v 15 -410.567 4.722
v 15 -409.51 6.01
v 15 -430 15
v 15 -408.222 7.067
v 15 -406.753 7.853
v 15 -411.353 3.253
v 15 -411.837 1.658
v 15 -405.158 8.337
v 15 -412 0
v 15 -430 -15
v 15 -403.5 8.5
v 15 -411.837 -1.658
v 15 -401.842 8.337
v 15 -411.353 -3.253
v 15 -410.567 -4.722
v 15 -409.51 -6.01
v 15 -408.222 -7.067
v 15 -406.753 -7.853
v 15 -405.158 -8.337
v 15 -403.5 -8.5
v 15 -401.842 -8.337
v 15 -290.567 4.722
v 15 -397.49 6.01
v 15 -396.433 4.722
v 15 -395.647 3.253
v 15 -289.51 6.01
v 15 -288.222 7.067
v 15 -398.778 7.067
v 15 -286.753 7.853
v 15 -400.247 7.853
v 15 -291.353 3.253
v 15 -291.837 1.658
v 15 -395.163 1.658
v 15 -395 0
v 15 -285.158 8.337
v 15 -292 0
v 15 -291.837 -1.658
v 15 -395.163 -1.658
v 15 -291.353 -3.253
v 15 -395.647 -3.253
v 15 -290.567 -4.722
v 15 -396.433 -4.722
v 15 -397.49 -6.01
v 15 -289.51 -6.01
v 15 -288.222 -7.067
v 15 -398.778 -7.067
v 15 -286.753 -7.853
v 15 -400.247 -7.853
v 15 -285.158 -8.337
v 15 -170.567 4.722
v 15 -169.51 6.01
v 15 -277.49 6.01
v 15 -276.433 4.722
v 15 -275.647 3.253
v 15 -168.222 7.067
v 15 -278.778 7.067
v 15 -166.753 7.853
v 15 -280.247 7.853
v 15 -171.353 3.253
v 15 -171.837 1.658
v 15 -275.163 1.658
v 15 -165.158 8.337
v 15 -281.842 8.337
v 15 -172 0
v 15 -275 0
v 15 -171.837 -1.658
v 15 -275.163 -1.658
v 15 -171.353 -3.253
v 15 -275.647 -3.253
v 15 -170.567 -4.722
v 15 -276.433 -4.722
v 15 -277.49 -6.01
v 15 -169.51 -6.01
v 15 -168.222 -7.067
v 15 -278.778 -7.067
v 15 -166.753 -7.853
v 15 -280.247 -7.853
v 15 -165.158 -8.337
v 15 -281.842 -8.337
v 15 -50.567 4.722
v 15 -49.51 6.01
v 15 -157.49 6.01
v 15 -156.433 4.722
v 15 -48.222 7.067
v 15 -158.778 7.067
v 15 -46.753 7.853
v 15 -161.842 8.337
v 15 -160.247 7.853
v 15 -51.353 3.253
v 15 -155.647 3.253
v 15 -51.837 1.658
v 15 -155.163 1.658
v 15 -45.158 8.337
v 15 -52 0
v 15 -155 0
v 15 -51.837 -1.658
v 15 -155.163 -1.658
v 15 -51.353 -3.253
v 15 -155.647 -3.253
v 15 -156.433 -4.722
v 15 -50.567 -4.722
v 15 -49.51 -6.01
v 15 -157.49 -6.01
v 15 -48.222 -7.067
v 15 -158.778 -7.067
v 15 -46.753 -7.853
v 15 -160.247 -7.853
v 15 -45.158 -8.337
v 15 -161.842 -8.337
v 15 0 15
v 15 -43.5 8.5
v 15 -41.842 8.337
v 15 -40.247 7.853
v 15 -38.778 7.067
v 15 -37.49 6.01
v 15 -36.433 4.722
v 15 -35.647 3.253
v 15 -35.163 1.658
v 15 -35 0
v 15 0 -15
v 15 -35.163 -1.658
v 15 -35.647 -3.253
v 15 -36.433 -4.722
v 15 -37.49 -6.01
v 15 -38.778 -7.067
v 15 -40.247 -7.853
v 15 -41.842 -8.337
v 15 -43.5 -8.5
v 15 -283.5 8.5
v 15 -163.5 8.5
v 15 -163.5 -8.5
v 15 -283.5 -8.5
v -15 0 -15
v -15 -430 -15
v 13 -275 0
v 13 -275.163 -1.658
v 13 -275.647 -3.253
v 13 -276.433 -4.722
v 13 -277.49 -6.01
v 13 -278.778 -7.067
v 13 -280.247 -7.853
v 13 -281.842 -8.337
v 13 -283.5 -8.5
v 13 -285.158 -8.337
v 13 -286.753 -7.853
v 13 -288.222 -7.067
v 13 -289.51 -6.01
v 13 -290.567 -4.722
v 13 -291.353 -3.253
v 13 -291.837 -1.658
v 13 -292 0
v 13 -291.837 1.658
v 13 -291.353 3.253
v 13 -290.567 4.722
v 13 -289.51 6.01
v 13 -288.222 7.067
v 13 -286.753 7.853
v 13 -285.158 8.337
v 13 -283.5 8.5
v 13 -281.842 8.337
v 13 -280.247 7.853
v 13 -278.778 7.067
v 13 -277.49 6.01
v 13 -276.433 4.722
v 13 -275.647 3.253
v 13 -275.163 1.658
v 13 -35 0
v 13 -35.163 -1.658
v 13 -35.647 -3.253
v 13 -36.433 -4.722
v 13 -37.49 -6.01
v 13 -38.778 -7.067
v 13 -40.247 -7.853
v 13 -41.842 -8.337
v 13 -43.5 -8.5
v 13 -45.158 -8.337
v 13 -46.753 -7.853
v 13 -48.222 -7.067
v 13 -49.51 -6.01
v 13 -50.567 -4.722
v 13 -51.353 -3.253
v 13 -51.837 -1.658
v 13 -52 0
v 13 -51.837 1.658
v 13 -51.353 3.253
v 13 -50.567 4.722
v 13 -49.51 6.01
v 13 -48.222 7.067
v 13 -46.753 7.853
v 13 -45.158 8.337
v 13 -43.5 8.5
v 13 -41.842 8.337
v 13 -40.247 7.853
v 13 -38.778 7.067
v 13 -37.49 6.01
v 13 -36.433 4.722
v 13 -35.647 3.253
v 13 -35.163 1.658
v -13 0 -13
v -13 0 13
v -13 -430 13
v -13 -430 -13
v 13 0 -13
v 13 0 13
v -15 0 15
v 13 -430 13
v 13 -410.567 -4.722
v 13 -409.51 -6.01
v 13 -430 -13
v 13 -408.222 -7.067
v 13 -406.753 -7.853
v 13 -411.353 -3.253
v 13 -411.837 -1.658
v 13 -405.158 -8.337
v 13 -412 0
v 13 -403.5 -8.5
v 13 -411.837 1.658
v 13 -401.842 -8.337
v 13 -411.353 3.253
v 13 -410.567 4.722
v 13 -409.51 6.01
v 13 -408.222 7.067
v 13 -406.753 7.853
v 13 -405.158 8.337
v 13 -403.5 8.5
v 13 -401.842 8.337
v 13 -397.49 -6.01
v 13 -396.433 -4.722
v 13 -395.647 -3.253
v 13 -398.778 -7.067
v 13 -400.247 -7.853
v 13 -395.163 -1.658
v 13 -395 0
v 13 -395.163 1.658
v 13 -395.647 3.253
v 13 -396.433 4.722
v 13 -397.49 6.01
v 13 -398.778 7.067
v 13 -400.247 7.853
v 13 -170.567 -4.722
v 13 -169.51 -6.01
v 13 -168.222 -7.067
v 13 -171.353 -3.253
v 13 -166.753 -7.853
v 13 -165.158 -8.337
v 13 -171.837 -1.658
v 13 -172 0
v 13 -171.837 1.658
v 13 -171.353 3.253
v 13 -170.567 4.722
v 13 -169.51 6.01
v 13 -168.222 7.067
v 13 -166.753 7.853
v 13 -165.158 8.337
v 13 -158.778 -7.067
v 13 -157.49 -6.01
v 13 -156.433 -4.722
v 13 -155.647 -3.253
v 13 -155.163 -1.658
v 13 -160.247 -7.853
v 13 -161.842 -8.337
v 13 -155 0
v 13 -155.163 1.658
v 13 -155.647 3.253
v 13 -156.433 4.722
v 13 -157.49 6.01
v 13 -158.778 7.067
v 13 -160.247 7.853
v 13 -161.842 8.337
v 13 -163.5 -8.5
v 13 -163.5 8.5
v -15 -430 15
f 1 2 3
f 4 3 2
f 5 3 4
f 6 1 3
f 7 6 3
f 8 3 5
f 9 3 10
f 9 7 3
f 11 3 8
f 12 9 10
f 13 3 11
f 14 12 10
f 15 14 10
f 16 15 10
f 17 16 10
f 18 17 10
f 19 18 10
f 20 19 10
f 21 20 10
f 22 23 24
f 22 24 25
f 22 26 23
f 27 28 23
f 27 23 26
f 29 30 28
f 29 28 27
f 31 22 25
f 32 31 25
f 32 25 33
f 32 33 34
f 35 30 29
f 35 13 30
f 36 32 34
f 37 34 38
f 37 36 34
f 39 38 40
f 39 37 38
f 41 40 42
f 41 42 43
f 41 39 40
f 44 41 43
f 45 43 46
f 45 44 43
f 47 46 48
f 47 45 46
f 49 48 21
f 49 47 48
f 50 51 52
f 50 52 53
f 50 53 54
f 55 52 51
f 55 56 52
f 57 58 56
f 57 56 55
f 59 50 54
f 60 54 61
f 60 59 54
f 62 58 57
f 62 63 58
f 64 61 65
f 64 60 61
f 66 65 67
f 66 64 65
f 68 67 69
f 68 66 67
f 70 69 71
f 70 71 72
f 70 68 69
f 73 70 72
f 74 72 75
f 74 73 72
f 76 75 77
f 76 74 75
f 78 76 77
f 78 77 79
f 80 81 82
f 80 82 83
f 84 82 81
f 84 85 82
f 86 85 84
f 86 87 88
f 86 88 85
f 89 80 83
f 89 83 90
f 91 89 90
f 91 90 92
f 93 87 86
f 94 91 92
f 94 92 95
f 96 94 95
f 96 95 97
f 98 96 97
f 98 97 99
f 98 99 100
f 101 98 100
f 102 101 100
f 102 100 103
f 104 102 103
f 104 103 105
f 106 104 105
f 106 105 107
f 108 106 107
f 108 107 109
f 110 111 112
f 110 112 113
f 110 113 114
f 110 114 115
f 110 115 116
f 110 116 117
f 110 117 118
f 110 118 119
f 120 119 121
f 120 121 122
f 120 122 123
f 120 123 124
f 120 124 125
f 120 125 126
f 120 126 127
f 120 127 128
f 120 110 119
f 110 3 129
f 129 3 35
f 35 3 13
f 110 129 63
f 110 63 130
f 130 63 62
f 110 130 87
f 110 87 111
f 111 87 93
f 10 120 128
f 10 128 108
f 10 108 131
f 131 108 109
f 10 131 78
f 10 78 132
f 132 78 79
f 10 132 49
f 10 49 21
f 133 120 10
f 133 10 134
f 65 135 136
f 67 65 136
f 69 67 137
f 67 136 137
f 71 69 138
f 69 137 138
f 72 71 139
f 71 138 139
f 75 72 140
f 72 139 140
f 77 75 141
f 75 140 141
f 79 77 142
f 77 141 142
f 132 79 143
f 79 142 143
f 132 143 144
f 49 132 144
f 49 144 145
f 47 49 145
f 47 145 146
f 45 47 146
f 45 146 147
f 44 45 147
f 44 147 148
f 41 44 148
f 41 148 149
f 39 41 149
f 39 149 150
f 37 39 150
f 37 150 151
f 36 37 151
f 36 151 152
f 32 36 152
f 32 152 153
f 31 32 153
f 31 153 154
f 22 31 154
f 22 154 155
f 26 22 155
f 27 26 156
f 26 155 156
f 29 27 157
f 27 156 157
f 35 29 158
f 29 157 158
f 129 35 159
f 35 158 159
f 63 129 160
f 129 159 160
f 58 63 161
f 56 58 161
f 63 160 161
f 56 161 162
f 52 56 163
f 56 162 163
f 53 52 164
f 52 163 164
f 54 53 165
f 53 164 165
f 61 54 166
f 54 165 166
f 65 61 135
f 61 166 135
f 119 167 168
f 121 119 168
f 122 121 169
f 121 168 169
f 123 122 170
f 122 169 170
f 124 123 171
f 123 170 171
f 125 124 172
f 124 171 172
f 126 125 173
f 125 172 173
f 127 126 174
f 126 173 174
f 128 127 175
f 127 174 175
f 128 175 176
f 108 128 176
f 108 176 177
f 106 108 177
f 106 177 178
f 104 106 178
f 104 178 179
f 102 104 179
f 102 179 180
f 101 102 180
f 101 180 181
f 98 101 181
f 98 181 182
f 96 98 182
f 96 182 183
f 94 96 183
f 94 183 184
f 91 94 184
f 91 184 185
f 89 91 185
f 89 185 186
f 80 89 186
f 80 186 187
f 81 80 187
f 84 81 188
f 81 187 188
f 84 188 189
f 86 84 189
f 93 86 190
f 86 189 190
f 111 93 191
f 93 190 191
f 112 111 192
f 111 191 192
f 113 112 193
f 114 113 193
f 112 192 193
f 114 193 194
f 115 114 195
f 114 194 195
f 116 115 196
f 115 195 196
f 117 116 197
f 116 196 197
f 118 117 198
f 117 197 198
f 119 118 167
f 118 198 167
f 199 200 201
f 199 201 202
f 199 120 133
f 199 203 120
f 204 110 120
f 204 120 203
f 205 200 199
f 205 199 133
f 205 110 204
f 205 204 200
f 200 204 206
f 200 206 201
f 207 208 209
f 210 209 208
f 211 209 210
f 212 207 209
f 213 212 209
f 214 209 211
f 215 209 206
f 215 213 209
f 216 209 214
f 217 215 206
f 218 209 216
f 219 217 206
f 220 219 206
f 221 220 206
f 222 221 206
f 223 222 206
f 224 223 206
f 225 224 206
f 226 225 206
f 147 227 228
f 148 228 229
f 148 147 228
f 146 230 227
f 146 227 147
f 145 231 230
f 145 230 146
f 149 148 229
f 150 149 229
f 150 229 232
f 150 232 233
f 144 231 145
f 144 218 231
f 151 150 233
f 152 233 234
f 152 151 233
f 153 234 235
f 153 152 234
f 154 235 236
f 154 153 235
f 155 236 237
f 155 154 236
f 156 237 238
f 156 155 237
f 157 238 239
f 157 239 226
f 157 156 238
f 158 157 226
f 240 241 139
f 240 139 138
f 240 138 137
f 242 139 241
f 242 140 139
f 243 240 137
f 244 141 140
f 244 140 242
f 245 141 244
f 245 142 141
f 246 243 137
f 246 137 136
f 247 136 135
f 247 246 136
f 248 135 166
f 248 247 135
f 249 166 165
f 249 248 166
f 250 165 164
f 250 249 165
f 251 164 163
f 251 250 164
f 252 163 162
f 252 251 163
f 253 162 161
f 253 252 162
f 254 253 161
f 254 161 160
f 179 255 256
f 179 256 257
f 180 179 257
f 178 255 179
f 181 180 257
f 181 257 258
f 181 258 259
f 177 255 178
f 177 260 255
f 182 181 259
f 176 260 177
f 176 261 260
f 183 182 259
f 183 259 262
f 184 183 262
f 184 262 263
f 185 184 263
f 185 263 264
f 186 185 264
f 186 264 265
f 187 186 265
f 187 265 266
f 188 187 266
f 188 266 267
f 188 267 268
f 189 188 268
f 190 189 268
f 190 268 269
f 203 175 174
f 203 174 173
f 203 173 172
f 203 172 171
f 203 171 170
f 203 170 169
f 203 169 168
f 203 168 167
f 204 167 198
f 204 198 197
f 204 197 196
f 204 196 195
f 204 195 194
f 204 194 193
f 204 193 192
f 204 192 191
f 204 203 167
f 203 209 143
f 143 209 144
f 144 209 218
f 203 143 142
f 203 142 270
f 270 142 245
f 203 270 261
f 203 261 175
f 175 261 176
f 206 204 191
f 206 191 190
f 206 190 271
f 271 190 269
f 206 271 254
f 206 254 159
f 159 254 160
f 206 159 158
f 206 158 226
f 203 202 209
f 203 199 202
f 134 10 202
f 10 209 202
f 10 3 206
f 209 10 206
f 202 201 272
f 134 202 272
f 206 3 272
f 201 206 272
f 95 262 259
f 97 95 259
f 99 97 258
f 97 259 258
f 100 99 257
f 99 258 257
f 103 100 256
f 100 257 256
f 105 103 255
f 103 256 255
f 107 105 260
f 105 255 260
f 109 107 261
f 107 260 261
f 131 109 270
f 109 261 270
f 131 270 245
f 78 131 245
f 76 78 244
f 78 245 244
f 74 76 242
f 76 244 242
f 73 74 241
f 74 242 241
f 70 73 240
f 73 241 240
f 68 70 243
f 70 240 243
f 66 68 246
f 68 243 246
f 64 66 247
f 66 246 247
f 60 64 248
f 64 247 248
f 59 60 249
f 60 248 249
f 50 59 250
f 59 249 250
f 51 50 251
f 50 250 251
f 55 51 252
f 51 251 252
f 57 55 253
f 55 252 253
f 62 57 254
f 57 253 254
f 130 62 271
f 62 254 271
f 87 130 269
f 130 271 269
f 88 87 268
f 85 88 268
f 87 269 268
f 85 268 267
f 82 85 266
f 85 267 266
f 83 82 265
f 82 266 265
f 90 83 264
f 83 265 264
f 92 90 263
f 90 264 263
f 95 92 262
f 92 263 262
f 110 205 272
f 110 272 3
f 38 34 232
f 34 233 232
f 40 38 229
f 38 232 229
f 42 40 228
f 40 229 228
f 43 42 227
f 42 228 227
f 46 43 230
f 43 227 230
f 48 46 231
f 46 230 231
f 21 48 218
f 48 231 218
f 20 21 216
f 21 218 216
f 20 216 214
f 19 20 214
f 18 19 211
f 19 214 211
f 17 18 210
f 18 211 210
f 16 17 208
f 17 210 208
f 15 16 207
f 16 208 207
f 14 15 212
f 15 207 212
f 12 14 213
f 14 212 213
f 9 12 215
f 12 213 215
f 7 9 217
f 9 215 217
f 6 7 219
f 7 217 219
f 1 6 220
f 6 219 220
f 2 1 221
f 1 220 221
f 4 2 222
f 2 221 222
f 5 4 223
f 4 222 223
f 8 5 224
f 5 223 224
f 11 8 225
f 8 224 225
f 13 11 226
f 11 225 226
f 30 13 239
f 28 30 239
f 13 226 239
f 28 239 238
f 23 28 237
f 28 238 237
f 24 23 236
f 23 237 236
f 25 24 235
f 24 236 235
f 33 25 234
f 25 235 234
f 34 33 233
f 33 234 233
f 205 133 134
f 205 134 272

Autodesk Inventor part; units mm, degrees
ref_plane "YZ Plane" through (0, 0, 0) normal (1, 0, 0) x (0, 1, 0)
ref_plane "XZ Plane" through (0, 0, 0) normal (0, 1, 0) x (-1, 0, 0)
ref_plane "XY Plane" through (0, 0, 0) normal (0, 0, 1) x (1, 0, 0)
sketch "Sketch9" plane through (0, 0, 0) normal (0, 1, 0) x (-1, 0, 0)
  line L0 (15, 15) -> (-15, 15)
  line L1 (-15, 15) -> (-15, -15)
  line L2 (-15, -15) -> (15, -15)
  line L3 (15, -15) -> (15, 15)
  line L4 (15, 15) -> (-15, -15) construction
  line L5 (-15, 15) -> (15, -15) construction
  line L6 (-13, 13) -> (13, 13)
  line L7 (13, 13) -> (13, -13)
  line L8 (13, -13) -> (-13, -13)
  line L9 (-13, -13) -> (-13, 13)
  point P0 (0, 0)
  dimension "d172" = 30
  dimension "d173" = 30
  dimension "d174" = 2
extrude "Extrusion3" add sketch "Sketch9" against normal blind 430
sketch "Sketch10" plane through (0, 0, 0) normal (1, 0, 0) x (0, 1, 0)
  line L0 (0, 15) -> (0, -15) construction
  line L1 (0, 15) -> (-430, 15) construction
  line L2 (-430, -15) -> (-430, 15) construction
  line L3 (0, -15) -> (-430, -15) construction
  line L4 (-412, 8.5) -> (-395, 8.5)
  line L5 (-395, 8.5) -> (-395, -8.5)
  line L6 (-395, -8.5) -> (-412, -8.5)
  line L7 (-412, -8.5) -> (-412, 8.5)
  line L8 (-412, 8.5) -> (-395, -8.5) construction
  line L9 (-395, 8.5) -> (-412, -8.5) construction
  circle A0 centre (-403.5, 0) radius 8.5
  line L10 (0, 15) -> (0, -15) projected
  point P0 (0, 0)
  point P1 (0, 0)
  point P2 (-430, 0)
  dimension "d177" = 17
  dimension "d178" = 17
  dimension "d191" = 18
extrude "Extrusion4" cut sketch "Sketch10" along normal through all contours A0
pattern_linear "Rectangular Pattern4" count 4 spacing 120 along (0, 1, 0) of "Extrusion4"
properties part number "ANP 1436 FDS WAY tube6" material "Stainless Steel"
